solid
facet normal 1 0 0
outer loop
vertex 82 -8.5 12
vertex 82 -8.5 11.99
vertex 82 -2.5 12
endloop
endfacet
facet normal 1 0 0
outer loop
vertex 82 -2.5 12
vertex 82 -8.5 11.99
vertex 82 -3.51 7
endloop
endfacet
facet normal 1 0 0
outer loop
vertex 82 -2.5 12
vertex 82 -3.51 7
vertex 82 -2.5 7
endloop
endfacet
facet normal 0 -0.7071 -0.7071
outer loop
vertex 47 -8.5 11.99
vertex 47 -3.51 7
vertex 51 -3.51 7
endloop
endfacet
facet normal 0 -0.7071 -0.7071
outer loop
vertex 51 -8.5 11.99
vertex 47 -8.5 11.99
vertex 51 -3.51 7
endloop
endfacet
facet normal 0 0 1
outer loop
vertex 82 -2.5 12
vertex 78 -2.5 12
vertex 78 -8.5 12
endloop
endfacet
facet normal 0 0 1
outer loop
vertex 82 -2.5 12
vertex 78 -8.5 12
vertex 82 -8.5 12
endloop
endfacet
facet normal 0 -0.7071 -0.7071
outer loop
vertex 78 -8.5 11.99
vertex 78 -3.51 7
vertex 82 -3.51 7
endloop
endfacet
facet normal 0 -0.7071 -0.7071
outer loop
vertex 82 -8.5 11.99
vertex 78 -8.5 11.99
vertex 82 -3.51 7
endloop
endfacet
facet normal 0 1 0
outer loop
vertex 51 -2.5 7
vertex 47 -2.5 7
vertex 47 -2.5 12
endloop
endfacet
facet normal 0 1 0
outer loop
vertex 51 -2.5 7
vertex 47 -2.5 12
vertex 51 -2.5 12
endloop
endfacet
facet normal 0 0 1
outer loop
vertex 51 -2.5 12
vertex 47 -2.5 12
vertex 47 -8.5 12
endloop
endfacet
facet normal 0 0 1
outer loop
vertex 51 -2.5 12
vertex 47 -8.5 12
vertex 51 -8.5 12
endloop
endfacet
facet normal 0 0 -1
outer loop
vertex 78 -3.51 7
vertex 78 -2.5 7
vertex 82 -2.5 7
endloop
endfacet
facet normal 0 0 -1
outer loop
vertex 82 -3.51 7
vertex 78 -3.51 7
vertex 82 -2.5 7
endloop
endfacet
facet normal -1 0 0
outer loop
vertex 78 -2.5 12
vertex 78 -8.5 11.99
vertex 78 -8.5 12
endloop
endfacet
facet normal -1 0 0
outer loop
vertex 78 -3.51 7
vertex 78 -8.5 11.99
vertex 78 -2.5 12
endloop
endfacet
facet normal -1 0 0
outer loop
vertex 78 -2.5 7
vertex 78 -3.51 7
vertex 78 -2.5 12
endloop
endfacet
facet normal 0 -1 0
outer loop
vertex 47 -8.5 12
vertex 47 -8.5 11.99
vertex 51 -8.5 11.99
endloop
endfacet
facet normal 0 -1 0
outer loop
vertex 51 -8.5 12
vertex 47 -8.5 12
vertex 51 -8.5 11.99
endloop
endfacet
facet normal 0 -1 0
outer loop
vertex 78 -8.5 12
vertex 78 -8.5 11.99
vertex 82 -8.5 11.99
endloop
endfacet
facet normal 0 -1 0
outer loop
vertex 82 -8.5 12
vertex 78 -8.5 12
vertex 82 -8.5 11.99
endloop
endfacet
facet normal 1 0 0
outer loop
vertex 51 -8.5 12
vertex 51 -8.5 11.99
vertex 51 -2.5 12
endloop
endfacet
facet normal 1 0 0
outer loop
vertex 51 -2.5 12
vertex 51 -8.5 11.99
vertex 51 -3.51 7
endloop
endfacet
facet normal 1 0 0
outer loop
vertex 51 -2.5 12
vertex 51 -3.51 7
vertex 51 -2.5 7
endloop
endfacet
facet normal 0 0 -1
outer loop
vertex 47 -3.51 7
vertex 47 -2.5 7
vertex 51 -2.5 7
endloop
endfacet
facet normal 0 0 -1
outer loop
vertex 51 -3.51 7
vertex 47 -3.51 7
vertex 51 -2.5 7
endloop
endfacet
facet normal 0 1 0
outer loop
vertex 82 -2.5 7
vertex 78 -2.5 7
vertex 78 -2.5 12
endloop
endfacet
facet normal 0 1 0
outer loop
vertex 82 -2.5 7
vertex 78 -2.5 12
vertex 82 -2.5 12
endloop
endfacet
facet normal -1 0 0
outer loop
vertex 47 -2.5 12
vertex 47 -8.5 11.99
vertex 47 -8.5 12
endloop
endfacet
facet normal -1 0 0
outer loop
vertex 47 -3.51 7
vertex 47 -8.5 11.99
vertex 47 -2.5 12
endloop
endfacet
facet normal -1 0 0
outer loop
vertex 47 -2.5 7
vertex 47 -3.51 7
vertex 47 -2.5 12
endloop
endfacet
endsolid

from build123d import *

# Parameters (mm, degrees)
BOX003_W     = 4
BOX003_H     = 6
BOX003_DEPTH = 5
BOX002_W     = 4
BOX002_H     = 6
BOX002_DEPTH = 5
CHAMFER_SIZE = 4.99


with BuildPart() as stiffenercube2:
    # Box003 → Box003 (new body)
    with BuildSketch(Plane(origin=(78, -8.5, 7), x_dir=(1, 0, 0), z_dir=(0, 0, 1))):
        with Locations((2, 3)):
            Rectangle(BOX003_W, BOX003_H)
    extrude(amount=BOX003_DEPTH)


with BuildPart() as stiffenerchamfer:
    # Box002 → Box002 (new body)
    with BuildSketch(Plane(origin=(47, -8.5, 7), x_dir=(1, 0, 0), z_dir=(0, 0, 1))):
        with Locations((2, 3)):
            Rectangle(BOX002_W, BOX002_H)
    extrude(amount=BOX002_DEPTH)

    # Fusion003: union StiffenerCube2
    add(stiffenercube2.part)

    # Chamfer
    chamfer_edges = [stiffenerchamfer.edges().sort_by_distance(p)[0] for p in [
        (49, -8.5, 7),
        (80, -8.5, 7),
    ]]
    chamfer(chamfer_edges, length=CHAMFER_SIZE)


solid = stiffenerchamfer.part
